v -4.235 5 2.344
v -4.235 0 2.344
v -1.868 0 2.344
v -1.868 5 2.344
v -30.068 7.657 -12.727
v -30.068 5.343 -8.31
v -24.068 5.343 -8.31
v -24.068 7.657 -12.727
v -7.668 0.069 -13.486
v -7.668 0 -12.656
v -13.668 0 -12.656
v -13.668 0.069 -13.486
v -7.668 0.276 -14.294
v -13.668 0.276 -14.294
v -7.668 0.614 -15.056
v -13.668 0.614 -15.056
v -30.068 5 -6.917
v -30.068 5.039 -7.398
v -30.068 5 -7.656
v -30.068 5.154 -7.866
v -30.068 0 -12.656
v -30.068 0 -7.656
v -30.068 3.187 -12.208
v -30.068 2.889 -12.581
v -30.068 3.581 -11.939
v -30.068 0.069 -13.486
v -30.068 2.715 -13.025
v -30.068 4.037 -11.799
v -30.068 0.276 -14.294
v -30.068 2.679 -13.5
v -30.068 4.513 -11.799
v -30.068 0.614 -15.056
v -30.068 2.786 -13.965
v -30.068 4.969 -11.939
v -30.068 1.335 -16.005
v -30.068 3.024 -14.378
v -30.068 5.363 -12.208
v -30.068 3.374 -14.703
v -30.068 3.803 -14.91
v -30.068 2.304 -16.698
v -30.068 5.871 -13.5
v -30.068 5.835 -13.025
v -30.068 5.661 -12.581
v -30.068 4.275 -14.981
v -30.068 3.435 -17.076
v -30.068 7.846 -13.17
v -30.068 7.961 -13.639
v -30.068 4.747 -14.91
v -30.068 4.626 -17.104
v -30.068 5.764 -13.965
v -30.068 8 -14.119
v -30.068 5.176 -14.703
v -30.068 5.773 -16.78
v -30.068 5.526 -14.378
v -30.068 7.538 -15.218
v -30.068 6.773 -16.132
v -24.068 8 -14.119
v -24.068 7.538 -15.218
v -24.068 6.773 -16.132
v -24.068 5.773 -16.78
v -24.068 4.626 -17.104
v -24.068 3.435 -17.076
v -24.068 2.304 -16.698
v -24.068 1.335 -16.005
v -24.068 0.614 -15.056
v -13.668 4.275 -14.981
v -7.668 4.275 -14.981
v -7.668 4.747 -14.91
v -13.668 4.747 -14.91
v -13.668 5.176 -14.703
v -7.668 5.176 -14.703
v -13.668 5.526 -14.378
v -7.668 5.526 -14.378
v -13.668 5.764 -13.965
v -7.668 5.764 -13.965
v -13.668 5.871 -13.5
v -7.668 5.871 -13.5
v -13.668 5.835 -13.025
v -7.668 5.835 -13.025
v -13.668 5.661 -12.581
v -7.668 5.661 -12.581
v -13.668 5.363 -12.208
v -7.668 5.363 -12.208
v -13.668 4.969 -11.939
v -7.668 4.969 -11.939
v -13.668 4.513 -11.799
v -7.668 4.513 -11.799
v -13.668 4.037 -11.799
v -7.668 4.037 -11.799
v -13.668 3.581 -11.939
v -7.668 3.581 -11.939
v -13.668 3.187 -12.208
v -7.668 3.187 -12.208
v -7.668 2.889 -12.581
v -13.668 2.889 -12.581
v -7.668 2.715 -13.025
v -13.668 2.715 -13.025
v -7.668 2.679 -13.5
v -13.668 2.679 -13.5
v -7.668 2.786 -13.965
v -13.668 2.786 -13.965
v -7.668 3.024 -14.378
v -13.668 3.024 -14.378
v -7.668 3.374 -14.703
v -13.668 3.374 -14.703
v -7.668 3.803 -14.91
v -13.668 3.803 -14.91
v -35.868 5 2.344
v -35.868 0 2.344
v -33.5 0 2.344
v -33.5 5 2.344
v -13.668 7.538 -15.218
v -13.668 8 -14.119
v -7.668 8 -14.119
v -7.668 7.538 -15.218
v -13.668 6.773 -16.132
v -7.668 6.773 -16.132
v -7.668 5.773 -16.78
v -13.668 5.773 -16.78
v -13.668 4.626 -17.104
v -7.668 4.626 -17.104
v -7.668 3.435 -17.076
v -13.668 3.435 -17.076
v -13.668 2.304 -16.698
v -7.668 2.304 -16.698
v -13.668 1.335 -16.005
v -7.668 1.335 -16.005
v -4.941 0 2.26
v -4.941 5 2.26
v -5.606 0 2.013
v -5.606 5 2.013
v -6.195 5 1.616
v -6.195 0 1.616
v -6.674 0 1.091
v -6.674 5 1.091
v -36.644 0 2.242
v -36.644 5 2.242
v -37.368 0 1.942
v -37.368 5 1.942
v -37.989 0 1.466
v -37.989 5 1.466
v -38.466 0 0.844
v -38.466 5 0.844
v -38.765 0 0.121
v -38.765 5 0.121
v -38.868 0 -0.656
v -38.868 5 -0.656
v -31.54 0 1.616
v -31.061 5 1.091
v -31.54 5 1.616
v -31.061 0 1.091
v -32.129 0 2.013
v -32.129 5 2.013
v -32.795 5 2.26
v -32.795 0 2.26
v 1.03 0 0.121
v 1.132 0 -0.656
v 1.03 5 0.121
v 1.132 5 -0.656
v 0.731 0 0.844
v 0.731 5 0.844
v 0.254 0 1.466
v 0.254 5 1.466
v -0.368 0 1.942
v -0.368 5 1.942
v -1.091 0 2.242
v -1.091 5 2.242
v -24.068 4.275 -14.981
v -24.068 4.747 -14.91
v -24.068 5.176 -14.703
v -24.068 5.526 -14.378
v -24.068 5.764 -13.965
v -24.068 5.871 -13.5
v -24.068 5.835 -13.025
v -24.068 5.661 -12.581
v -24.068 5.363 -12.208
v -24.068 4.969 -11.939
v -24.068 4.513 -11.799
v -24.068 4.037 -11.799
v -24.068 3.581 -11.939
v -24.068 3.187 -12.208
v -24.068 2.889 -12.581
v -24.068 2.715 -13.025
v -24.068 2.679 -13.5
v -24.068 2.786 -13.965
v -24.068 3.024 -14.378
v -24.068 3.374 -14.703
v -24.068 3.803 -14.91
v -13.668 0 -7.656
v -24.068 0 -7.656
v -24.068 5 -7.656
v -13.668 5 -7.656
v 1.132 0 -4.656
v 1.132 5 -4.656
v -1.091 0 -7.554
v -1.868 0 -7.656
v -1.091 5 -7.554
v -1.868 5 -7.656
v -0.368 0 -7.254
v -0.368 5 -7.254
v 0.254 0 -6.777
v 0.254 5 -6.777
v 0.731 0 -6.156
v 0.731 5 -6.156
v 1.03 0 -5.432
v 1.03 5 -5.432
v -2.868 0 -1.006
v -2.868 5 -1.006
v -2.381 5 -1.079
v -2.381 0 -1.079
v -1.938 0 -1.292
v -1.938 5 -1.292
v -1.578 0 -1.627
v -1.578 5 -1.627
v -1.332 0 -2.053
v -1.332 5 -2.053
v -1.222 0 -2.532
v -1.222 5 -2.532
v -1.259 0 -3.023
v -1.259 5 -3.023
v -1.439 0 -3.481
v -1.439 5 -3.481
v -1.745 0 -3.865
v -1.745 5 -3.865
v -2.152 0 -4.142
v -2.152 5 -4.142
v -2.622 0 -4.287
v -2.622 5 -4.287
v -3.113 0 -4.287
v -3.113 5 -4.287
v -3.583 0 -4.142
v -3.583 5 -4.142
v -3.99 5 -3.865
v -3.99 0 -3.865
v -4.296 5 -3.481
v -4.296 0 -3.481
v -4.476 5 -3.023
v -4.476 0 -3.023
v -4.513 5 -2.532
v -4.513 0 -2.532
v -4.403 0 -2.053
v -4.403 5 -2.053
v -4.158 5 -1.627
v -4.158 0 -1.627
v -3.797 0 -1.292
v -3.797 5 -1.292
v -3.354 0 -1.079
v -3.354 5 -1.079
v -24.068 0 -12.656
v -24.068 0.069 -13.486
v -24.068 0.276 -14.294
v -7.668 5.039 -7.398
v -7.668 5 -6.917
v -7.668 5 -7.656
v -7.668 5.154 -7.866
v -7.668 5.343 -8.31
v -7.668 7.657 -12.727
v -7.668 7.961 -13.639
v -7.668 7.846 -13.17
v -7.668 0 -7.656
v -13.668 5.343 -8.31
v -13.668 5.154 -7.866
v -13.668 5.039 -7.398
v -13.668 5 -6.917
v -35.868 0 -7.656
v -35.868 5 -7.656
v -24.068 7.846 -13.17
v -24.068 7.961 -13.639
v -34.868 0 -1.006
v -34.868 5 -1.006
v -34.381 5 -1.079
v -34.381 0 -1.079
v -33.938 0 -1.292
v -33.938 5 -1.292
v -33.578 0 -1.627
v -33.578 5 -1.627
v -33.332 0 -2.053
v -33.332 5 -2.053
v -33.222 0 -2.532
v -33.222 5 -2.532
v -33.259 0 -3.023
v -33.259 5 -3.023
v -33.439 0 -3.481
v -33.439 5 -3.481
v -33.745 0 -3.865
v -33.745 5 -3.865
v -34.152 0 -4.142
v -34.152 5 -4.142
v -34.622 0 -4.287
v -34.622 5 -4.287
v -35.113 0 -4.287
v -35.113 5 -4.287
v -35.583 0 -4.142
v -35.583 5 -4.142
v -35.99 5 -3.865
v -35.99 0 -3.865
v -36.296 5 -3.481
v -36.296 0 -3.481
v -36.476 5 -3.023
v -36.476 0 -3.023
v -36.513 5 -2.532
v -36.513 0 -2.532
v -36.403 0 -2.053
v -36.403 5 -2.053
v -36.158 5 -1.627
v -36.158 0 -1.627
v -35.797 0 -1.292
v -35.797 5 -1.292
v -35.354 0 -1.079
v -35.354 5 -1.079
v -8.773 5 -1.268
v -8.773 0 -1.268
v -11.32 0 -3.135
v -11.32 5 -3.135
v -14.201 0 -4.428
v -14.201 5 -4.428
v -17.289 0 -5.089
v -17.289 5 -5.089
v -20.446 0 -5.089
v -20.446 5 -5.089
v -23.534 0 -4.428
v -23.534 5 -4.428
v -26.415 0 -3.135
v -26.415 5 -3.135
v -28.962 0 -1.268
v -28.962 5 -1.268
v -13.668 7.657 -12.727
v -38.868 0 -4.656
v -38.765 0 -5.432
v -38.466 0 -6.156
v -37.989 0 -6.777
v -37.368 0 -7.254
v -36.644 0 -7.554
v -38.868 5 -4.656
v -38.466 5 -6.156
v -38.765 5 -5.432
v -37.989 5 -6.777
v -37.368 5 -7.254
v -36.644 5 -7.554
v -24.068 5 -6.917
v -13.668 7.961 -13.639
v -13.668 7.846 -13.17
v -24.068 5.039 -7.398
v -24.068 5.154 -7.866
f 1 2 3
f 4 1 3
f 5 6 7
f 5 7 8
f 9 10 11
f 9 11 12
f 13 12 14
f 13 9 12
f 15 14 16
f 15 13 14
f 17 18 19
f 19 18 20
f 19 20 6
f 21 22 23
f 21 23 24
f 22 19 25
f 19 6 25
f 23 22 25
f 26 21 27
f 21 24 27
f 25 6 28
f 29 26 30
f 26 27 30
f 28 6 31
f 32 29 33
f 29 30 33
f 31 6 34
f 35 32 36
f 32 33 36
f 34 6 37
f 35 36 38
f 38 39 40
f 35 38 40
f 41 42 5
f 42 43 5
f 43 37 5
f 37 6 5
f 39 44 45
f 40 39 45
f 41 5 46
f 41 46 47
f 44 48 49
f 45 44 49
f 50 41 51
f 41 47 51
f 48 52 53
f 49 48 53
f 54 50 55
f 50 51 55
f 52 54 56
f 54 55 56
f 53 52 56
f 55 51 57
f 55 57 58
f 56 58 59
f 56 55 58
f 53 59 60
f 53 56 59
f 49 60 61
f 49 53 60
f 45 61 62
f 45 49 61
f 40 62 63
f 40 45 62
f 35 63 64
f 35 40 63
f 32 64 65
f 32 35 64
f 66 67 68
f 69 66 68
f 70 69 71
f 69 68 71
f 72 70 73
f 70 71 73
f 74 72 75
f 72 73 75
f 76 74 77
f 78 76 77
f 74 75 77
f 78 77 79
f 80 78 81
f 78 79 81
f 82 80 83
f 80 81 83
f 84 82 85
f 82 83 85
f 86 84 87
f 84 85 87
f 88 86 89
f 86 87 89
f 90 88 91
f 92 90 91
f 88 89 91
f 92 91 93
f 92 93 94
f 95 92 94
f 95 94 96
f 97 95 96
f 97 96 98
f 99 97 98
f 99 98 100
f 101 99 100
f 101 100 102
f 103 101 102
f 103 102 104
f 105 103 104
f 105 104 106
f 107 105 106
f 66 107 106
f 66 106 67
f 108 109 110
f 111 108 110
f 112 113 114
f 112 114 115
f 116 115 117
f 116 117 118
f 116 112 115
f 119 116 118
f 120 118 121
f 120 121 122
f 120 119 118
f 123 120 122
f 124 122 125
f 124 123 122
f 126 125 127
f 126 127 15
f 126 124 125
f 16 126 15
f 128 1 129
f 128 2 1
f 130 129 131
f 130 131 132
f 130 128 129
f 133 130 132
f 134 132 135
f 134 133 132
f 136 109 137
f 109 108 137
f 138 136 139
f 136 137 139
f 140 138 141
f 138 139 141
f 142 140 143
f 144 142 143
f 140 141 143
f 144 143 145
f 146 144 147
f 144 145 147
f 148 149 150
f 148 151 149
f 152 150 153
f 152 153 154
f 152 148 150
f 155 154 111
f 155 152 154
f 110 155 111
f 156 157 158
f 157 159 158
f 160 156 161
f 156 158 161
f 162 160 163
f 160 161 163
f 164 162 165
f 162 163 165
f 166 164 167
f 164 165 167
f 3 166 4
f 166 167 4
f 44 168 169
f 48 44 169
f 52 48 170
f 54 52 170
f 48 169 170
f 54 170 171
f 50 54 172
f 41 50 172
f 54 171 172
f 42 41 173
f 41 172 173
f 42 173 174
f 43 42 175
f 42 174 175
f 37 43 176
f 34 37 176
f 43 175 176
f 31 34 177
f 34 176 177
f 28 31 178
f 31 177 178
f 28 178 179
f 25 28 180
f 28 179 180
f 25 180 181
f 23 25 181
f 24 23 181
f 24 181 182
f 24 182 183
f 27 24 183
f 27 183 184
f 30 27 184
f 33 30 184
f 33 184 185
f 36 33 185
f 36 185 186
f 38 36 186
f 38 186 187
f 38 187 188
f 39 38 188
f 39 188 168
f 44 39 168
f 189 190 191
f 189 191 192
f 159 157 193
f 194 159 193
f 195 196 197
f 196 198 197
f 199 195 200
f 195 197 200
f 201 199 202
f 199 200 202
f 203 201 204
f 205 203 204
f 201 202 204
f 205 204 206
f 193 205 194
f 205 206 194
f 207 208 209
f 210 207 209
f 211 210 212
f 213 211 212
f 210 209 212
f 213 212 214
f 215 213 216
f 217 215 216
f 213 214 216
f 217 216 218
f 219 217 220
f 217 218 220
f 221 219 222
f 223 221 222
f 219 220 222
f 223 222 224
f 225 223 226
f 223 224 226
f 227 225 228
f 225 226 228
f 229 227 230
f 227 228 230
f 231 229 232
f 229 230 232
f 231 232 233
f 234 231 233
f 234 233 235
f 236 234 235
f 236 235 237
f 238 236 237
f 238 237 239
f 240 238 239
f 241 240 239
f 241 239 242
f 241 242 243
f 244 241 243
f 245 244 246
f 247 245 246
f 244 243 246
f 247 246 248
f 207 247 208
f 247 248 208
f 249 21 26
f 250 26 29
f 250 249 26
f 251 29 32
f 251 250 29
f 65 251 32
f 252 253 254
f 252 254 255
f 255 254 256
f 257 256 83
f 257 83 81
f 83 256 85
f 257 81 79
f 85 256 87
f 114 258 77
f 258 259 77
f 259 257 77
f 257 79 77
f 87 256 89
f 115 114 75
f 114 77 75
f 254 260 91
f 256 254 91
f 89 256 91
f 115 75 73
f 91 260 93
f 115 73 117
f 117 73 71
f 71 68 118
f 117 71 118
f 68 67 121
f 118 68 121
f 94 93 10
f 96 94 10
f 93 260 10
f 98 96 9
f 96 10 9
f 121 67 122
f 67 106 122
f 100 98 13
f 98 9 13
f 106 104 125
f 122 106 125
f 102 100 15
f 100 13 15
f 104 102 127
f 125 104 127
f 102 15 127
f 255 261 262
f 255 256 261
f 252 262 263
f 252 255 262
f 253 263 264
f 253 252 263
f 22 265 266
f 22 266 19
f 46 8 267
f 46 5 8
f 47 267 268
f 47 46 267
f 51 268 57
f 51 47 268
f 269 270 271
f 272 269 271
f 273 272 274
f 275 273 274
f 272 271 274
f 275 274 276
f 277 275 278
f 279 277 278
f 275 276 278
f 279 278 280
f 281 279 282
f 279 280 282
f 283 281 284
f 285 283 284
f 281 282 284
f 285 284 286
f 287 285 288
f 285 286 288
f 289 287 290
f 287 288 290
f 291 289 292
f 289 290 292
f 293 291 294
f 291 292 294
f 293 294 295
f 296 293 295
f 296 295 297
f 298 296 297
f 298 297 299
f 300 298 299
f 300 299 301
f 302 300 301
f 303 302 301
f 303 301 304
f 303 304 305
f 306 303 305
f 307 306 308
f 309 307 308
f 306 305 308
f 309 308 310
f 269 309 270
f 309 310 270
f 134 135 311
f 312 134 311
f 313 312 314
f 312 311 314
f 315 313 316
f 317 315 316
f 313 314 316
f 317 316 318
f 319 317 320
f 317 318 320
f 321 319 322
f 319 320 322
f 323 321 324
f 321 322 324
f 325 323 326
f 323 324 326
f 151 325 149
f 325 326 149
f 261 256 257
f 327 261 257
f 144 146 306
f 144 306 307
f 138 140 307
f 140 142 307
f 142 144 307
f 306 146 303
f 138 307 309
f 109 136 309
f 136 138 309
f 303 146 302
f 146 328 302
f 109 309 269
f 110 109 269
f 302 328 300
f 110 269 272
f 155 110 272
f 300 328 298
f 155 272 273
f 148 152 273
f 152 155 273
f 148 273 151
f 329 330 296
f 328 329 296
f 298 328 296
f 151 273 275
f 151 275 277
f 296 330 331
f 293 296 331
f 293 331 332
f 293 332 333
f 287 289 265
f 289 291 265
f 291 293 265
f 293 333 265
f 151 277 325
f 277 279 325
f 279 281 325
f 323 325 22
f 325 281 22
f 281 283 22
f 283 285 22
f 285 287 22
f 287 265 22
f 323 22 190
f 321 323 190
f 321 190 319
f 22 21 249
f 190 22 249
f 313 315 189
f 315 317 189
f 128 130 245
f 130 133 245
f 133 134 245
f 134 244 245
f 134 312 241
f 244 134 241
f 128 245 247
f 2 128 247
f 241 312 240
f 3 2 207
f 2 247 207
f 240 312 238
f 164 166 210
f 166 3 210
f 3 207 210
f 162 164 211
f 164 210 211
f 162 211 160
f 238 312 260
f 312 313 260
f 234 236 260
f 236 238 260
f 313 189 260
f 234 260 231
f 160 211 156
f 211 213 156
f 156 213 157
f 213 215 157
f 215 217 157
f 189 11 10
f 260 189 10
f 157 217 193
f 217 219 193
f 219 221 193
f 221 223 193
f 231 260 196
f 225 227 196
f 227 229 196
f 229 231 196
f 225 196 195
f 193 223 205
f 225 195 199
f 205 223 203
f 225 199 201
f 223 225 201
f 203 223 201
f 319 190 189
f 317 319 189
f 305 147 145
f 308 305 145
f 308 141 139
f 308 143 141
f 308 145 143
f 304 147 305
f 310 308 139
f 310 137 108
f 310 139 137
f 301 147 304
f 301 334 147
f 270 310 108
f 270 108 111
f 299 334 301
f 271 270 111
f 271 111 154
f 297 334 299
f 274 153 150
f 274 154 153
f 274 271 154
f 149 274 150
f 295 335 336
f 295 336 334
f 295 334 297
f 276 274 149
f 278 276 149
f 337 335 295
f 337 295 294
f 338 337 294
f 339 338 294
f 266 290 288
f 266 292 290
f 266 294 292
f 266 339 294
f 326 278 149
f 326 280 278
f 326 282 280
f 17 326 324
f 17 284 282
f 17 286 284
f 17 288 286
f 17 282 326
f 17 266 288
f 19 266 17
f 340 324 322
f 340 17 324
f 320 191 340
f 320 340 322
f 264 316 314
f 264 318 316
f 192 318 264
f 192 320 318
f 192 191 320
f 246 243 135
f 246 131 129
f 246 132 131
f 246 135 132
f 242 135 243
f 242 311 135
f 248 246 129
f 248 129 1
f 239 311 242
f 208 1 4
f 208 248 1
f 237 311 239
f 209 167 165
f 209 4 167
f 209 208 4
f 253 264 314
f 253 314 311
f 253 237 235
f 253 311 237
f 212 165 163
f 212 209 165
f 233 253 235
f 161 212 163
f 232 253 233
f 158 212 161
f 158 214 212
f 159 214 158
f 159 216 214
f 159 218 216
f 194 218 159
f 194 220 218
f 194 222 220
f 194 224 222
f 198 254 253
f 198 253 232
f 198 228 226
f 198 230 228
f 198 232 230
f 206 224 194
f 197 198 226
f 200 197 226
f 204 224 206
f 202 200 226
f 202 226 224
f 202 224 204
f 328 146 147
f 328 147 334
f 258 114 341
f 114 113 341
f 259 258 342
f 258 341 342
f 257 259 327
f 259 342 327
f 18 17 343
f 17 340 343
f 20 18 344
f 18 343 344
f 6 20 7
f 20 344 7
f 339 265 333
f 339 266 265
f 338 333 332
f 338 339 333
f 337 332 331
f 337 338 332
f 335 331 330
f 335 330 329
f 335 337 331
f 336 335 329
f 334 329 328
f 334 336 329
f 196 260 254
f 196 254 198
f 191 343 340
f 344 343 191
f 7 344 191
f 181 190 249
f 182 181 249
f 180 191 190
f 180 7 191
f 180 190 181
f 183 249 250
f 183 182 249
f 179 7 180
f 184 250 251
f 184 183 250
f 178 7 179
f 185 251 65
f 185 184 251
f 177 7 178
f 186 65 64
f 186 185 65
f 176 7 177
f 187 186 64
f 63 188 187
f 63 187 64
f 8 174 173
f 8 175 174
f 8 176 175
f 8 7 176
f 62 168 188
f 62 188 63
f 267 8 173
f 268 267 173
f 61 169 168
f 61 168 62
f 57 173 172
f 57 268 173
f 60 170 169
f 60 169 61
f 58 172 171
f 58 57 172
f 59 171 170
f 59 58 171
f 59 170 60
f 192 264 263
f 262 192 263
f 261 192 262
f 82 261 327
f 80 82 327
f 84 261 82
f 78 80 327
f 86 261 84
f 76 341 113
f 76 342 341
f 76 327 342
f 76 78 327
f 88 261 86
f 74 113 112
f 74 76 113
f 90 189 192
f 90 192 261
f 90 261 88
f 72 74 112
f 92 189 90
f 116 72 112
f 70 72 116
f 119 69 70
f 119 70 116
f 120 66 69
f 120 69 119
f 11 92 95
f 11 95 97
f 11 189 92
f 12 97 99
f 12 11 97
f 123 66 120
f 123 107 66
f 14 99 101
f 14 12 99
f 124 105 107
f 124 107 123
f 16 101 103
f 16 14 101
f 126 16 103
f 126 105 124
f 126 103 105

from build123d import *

# Parameters (mm, degrees)
ESQUISSE1_W                    = 40
ESQUISSE1_H                    = 10
BOSS_EXTRU_1_DEPTH             = 5
ESQUISSE2_R                    = 1.65
ENL_V_MAT_EXTRU_1_DEPTH        = 5
BOSS_EXTRU_2_REACH             = 41.929
ESQUISSE3_W                    = 6
ESQUISSE3_H                    = 10
BOSS_EXTRU_2_DIRECTION_2_DEPTH = 5
ESQUISSE4_R                    = 1.6
ENL_V_MAT_EXTRU_2_DEPTH        = 38.217801601
CONG_1_R                       = 5
ENL_V_MAT_EXTRU_3_DEPTH        = 38.217801601
CONG_3_R                       = 3
CONG_4_R                       = 3
CONG_5_R                       = 3
ENL_V_MAT_EXTRU_4_REACH        = 44.982
CONG_6_R                       = 3
CONG_7_START                   = -30.067545716
CONG_7_DEPTH                   = 22.4


with BuildPart() as part:
    # Esquisse1 → Boss.-Extru.1 (new body)
    with BuildSketch(Plane(origin=(0, 0, 0), x_dir=(1, 0, 0), z_dir=(0, 1, 0))):
        with Locations((-18.867545716, 2.655728702)):
            Rectangle(ESQUISSE1_W, ESQUISSE1_H)
    extrude(amount=BOSS_EXTRU_1_DEPTH)

    # Esquisse2 → Enlèv. mat.-Extru.1 (cut)
    with BuildSketch(Plane(origin=(0, 5, 0), x_dir=(1, 0, 0), z_dir=(0, 1, 0))):
        with Locations(Location((-34.867545716, 2.655728702, 0), (0, 0, 270))):
            Circle(ESQUISSE2_R)
        with Locations(Location((-2.867545716, 2.655728702, 0), (0, 0, 270))):
            Circle(ESQUISSE2_R)
    extrude(amount=-ENL_V_MAT_EXTRU_1_DEPTH, mode=Mode.SUBTRACT)

    # Boss.-Extru.2: up to this face of the body (flat: up to its plane)
    boss_extru_2_end = Plane(part.part.faces().sort_by_distance((-18.867545716, 0, -2.655728702))[0])
    # Esquisse3 → Boss.-Extru.2 (add, up to the picked face)
    with BuildSketch(Plane(origin=(0, 5, 0), x_dir=(1, 0, 0), z_dir=(0, 1, 0)), mode=Mode.PRIVATE) as boss_extru_2_sk1:
        with Locations((-10.667545716, 12.655728702)):
            Rectangle(ESQUISSE3_W, ESQUISSE3_H)
    boss_extru_2_tool1 = split(extrude(boss_extru_2_sk1.sketch, amount=-BOSS_EXTRU_2_REACH, mode=Mode.PRIVATE), bisect_by=boss_extru_2_end, keep=Keep.BOTH, mode=Mode.PRIVATE)
    # Esquisse3 → Boss.-Extru.2 (add, up to the picked face)
    with BuildSketch(Plane(origin=(0, 5, 0), x_dir=(1, 0, 0), z_dir=(0, 1, 0)), mode=Mode.PRIVATE) as boss_extru_2_sk2:
        with Locations((-27.067545716, 12.655728702)):
            Rectangle(ESQUISSE3_W, ESQUISSE3_H)
    boss_extru_2_tool2 = split(extrude(boss_extru_2_sk2.sketch, amount=-BOSS_EXTRU_2_REACH, mode=Mode.PRIVATE), bisect_by=boss_extru_2_end, keep=Keep.BOTH, mode=Mode.PRIVATE)
    add(boss_extru_2_tool1.solids().sort_by(Axis((-10.667546, 5, -12.655729), (0, -1, 0)))[0])
    add(boss_extru_2_tool2.solids().sort_by(Axis((-27.067546, 5, -12.655729), (0, -1, 0)))[0])

    # Esquisse3 → Boss.-Extru.2 direction 2 (add)
    with BuildSketch(Plane(origin=(0, 5, 0), x_dir=(1, 0, 0), z_dir=(0, 1, 0))):
        with Locations((-10.667545716, 12.655728702)):
            Rectangle(ESQUISSE3_W, ESQUISSE3_H)
        with Locations((-27.067545716, 12.655728702)):
            Rectangle(ESQUISSE3_W, ESQUISSE3_H)
    extrude(amount=BOSS_EXTRU_2_DIRECTION_2_DEPTH)

    # Esquisse4 → Enlèv. mat.-Extru.2 (cut, through all)
    with BuildSketch(Plane(origin=(-7.667545716, 0, 0), x_dir=(0, 0, -1), z_dir=(1, 0, 0))):
        with Locations((13.380728702, 4.275)):
            Circle(ESQUISSE4_R)
    extrude(amount=-ENL_V_MAT_EXTRU_2_DEPTH, mode=Mode.SUBTRACT)

    # Congé1
    cong_1_edges = [part.edges().sort_by_distance(p)[0] for p in [
        (-27.067545716, 0, -17.655728702),
        (-10.667545716, 0, -17.655728702),
    ]]
    fillet(cong_1_edges, radius=CONG_1_R)

    # Esquisse5 → Enlèv. mat.-Extru.3 (cut, through all)
    with BuildSketch(Plane(origin=(-7.667545716, 0, 0), x_dir=(0, 0, -1), z_dir=(1, 0, 0))):
        Polygon((7.655728702, 5), (13.380728702, 8), (17.655728702, 8), (17.655728702, 10), (7.655728702, 10), align=None)
    extrude(amount=-ENL_V_MAT_EXTRU_3_DEPTH, mode=Mode.SUBTRACT)

    # Congé3
    cong_3_edges = [part.edges().sort_by_distance(p)[0] for p in [
        (-10.667545716, 8, -13.380728702),
        (-27.067545716, 8, -13.380728702),
    ]]
    fillet(cong_3_edges, radius=CONG_3_R)

    # Congé4
    cong_4_edges = [part.edges().sort_by_distance(p)[0] for p in [
        (-10.667545716, 5, -7.655728702),
        (-27.067545716, 5, -7.655728702),
    ]]
    fillet(cong_4_edges, radius=CONG_4_R)

    # Congé5
    cong_5_edges = [part.edges().sort_by_distance(p)[0] for p in [
        (-38.867545716, 2.5, -7.655728702),
        (-38.867545716, 2.5, 2.344271298),
        (1.132454284, 2.5, 2.344271298),
        (1.132454284, 2.5, -7.655728702),
    ]]
    fillet(cong_5_edges, radius=CONG_5_R)

    # Esquisse6 → Enlèv. mat.-Extru.4 (cut, up to next)
    with BuildSketch(Plane(origin=(0, 5, 0), x_dir=(1, 0, 0), z_dir=(0, 1, 0)), mode=Mode.PRIVATE) as enl_v_mat_extru_4_sk1:
        with BuildLine():
            Line((-31.867545716, -2.344271298), (-5.867545716, -2.344271298))
            ThreePointArc((-5.867545716, -2.344271298), (-18.867545716, 5.172413928), (-31.867545716, -2.344271298))
        make_face()
    enl_v_mat_extru_4_tool1 = extrude(enl_v_mat_extru_4_sk1.sketch, amount=-ENL_V_MAT_EXTRU_4_REACH, mode=Mode.PRIVATE) & part.part
    add(enl_v_mat_extru_4_tool1.solids().sort_by_distance((-18.867546, 5, -0.73807))[0], mode=Mode.SUBTRACT)

    # Congé6
    cong_6_edges = [part.edges().sort_by_distance(p)[0] for p in [
        (-31.867545716, 2.5, 2.344271298),
        (-5.867545716, 2.5, 2.344271298),
    ]]
    fillet(cong_6_edges, radius=CONG_6_R)

    # Congé7: read off the stored shape, not the designer's step
    # Congé7 outline → Congé7 (cut)
    with BuildSketch(Plane.YZ.offset(CONG_7_START)):
        with BuildLine():
            Line((8, -17.655728702), (8, -14.119135311))
            ThreePointArc((8, -14.119135311), (4.626068057, -17.103985452), (0.613789507, -15.055969837))
            ThreePointArc((0.613789507, -15.055969837), (2.450608472, -16.956961414), (5, -17.655728702))
            Line((5, -17.655728702), (8, -17.655728702))
        make_face()
    extrude(amount=CONG_7_DEPTH, mode=Mode.SUBTRACT)


solid = part.part
